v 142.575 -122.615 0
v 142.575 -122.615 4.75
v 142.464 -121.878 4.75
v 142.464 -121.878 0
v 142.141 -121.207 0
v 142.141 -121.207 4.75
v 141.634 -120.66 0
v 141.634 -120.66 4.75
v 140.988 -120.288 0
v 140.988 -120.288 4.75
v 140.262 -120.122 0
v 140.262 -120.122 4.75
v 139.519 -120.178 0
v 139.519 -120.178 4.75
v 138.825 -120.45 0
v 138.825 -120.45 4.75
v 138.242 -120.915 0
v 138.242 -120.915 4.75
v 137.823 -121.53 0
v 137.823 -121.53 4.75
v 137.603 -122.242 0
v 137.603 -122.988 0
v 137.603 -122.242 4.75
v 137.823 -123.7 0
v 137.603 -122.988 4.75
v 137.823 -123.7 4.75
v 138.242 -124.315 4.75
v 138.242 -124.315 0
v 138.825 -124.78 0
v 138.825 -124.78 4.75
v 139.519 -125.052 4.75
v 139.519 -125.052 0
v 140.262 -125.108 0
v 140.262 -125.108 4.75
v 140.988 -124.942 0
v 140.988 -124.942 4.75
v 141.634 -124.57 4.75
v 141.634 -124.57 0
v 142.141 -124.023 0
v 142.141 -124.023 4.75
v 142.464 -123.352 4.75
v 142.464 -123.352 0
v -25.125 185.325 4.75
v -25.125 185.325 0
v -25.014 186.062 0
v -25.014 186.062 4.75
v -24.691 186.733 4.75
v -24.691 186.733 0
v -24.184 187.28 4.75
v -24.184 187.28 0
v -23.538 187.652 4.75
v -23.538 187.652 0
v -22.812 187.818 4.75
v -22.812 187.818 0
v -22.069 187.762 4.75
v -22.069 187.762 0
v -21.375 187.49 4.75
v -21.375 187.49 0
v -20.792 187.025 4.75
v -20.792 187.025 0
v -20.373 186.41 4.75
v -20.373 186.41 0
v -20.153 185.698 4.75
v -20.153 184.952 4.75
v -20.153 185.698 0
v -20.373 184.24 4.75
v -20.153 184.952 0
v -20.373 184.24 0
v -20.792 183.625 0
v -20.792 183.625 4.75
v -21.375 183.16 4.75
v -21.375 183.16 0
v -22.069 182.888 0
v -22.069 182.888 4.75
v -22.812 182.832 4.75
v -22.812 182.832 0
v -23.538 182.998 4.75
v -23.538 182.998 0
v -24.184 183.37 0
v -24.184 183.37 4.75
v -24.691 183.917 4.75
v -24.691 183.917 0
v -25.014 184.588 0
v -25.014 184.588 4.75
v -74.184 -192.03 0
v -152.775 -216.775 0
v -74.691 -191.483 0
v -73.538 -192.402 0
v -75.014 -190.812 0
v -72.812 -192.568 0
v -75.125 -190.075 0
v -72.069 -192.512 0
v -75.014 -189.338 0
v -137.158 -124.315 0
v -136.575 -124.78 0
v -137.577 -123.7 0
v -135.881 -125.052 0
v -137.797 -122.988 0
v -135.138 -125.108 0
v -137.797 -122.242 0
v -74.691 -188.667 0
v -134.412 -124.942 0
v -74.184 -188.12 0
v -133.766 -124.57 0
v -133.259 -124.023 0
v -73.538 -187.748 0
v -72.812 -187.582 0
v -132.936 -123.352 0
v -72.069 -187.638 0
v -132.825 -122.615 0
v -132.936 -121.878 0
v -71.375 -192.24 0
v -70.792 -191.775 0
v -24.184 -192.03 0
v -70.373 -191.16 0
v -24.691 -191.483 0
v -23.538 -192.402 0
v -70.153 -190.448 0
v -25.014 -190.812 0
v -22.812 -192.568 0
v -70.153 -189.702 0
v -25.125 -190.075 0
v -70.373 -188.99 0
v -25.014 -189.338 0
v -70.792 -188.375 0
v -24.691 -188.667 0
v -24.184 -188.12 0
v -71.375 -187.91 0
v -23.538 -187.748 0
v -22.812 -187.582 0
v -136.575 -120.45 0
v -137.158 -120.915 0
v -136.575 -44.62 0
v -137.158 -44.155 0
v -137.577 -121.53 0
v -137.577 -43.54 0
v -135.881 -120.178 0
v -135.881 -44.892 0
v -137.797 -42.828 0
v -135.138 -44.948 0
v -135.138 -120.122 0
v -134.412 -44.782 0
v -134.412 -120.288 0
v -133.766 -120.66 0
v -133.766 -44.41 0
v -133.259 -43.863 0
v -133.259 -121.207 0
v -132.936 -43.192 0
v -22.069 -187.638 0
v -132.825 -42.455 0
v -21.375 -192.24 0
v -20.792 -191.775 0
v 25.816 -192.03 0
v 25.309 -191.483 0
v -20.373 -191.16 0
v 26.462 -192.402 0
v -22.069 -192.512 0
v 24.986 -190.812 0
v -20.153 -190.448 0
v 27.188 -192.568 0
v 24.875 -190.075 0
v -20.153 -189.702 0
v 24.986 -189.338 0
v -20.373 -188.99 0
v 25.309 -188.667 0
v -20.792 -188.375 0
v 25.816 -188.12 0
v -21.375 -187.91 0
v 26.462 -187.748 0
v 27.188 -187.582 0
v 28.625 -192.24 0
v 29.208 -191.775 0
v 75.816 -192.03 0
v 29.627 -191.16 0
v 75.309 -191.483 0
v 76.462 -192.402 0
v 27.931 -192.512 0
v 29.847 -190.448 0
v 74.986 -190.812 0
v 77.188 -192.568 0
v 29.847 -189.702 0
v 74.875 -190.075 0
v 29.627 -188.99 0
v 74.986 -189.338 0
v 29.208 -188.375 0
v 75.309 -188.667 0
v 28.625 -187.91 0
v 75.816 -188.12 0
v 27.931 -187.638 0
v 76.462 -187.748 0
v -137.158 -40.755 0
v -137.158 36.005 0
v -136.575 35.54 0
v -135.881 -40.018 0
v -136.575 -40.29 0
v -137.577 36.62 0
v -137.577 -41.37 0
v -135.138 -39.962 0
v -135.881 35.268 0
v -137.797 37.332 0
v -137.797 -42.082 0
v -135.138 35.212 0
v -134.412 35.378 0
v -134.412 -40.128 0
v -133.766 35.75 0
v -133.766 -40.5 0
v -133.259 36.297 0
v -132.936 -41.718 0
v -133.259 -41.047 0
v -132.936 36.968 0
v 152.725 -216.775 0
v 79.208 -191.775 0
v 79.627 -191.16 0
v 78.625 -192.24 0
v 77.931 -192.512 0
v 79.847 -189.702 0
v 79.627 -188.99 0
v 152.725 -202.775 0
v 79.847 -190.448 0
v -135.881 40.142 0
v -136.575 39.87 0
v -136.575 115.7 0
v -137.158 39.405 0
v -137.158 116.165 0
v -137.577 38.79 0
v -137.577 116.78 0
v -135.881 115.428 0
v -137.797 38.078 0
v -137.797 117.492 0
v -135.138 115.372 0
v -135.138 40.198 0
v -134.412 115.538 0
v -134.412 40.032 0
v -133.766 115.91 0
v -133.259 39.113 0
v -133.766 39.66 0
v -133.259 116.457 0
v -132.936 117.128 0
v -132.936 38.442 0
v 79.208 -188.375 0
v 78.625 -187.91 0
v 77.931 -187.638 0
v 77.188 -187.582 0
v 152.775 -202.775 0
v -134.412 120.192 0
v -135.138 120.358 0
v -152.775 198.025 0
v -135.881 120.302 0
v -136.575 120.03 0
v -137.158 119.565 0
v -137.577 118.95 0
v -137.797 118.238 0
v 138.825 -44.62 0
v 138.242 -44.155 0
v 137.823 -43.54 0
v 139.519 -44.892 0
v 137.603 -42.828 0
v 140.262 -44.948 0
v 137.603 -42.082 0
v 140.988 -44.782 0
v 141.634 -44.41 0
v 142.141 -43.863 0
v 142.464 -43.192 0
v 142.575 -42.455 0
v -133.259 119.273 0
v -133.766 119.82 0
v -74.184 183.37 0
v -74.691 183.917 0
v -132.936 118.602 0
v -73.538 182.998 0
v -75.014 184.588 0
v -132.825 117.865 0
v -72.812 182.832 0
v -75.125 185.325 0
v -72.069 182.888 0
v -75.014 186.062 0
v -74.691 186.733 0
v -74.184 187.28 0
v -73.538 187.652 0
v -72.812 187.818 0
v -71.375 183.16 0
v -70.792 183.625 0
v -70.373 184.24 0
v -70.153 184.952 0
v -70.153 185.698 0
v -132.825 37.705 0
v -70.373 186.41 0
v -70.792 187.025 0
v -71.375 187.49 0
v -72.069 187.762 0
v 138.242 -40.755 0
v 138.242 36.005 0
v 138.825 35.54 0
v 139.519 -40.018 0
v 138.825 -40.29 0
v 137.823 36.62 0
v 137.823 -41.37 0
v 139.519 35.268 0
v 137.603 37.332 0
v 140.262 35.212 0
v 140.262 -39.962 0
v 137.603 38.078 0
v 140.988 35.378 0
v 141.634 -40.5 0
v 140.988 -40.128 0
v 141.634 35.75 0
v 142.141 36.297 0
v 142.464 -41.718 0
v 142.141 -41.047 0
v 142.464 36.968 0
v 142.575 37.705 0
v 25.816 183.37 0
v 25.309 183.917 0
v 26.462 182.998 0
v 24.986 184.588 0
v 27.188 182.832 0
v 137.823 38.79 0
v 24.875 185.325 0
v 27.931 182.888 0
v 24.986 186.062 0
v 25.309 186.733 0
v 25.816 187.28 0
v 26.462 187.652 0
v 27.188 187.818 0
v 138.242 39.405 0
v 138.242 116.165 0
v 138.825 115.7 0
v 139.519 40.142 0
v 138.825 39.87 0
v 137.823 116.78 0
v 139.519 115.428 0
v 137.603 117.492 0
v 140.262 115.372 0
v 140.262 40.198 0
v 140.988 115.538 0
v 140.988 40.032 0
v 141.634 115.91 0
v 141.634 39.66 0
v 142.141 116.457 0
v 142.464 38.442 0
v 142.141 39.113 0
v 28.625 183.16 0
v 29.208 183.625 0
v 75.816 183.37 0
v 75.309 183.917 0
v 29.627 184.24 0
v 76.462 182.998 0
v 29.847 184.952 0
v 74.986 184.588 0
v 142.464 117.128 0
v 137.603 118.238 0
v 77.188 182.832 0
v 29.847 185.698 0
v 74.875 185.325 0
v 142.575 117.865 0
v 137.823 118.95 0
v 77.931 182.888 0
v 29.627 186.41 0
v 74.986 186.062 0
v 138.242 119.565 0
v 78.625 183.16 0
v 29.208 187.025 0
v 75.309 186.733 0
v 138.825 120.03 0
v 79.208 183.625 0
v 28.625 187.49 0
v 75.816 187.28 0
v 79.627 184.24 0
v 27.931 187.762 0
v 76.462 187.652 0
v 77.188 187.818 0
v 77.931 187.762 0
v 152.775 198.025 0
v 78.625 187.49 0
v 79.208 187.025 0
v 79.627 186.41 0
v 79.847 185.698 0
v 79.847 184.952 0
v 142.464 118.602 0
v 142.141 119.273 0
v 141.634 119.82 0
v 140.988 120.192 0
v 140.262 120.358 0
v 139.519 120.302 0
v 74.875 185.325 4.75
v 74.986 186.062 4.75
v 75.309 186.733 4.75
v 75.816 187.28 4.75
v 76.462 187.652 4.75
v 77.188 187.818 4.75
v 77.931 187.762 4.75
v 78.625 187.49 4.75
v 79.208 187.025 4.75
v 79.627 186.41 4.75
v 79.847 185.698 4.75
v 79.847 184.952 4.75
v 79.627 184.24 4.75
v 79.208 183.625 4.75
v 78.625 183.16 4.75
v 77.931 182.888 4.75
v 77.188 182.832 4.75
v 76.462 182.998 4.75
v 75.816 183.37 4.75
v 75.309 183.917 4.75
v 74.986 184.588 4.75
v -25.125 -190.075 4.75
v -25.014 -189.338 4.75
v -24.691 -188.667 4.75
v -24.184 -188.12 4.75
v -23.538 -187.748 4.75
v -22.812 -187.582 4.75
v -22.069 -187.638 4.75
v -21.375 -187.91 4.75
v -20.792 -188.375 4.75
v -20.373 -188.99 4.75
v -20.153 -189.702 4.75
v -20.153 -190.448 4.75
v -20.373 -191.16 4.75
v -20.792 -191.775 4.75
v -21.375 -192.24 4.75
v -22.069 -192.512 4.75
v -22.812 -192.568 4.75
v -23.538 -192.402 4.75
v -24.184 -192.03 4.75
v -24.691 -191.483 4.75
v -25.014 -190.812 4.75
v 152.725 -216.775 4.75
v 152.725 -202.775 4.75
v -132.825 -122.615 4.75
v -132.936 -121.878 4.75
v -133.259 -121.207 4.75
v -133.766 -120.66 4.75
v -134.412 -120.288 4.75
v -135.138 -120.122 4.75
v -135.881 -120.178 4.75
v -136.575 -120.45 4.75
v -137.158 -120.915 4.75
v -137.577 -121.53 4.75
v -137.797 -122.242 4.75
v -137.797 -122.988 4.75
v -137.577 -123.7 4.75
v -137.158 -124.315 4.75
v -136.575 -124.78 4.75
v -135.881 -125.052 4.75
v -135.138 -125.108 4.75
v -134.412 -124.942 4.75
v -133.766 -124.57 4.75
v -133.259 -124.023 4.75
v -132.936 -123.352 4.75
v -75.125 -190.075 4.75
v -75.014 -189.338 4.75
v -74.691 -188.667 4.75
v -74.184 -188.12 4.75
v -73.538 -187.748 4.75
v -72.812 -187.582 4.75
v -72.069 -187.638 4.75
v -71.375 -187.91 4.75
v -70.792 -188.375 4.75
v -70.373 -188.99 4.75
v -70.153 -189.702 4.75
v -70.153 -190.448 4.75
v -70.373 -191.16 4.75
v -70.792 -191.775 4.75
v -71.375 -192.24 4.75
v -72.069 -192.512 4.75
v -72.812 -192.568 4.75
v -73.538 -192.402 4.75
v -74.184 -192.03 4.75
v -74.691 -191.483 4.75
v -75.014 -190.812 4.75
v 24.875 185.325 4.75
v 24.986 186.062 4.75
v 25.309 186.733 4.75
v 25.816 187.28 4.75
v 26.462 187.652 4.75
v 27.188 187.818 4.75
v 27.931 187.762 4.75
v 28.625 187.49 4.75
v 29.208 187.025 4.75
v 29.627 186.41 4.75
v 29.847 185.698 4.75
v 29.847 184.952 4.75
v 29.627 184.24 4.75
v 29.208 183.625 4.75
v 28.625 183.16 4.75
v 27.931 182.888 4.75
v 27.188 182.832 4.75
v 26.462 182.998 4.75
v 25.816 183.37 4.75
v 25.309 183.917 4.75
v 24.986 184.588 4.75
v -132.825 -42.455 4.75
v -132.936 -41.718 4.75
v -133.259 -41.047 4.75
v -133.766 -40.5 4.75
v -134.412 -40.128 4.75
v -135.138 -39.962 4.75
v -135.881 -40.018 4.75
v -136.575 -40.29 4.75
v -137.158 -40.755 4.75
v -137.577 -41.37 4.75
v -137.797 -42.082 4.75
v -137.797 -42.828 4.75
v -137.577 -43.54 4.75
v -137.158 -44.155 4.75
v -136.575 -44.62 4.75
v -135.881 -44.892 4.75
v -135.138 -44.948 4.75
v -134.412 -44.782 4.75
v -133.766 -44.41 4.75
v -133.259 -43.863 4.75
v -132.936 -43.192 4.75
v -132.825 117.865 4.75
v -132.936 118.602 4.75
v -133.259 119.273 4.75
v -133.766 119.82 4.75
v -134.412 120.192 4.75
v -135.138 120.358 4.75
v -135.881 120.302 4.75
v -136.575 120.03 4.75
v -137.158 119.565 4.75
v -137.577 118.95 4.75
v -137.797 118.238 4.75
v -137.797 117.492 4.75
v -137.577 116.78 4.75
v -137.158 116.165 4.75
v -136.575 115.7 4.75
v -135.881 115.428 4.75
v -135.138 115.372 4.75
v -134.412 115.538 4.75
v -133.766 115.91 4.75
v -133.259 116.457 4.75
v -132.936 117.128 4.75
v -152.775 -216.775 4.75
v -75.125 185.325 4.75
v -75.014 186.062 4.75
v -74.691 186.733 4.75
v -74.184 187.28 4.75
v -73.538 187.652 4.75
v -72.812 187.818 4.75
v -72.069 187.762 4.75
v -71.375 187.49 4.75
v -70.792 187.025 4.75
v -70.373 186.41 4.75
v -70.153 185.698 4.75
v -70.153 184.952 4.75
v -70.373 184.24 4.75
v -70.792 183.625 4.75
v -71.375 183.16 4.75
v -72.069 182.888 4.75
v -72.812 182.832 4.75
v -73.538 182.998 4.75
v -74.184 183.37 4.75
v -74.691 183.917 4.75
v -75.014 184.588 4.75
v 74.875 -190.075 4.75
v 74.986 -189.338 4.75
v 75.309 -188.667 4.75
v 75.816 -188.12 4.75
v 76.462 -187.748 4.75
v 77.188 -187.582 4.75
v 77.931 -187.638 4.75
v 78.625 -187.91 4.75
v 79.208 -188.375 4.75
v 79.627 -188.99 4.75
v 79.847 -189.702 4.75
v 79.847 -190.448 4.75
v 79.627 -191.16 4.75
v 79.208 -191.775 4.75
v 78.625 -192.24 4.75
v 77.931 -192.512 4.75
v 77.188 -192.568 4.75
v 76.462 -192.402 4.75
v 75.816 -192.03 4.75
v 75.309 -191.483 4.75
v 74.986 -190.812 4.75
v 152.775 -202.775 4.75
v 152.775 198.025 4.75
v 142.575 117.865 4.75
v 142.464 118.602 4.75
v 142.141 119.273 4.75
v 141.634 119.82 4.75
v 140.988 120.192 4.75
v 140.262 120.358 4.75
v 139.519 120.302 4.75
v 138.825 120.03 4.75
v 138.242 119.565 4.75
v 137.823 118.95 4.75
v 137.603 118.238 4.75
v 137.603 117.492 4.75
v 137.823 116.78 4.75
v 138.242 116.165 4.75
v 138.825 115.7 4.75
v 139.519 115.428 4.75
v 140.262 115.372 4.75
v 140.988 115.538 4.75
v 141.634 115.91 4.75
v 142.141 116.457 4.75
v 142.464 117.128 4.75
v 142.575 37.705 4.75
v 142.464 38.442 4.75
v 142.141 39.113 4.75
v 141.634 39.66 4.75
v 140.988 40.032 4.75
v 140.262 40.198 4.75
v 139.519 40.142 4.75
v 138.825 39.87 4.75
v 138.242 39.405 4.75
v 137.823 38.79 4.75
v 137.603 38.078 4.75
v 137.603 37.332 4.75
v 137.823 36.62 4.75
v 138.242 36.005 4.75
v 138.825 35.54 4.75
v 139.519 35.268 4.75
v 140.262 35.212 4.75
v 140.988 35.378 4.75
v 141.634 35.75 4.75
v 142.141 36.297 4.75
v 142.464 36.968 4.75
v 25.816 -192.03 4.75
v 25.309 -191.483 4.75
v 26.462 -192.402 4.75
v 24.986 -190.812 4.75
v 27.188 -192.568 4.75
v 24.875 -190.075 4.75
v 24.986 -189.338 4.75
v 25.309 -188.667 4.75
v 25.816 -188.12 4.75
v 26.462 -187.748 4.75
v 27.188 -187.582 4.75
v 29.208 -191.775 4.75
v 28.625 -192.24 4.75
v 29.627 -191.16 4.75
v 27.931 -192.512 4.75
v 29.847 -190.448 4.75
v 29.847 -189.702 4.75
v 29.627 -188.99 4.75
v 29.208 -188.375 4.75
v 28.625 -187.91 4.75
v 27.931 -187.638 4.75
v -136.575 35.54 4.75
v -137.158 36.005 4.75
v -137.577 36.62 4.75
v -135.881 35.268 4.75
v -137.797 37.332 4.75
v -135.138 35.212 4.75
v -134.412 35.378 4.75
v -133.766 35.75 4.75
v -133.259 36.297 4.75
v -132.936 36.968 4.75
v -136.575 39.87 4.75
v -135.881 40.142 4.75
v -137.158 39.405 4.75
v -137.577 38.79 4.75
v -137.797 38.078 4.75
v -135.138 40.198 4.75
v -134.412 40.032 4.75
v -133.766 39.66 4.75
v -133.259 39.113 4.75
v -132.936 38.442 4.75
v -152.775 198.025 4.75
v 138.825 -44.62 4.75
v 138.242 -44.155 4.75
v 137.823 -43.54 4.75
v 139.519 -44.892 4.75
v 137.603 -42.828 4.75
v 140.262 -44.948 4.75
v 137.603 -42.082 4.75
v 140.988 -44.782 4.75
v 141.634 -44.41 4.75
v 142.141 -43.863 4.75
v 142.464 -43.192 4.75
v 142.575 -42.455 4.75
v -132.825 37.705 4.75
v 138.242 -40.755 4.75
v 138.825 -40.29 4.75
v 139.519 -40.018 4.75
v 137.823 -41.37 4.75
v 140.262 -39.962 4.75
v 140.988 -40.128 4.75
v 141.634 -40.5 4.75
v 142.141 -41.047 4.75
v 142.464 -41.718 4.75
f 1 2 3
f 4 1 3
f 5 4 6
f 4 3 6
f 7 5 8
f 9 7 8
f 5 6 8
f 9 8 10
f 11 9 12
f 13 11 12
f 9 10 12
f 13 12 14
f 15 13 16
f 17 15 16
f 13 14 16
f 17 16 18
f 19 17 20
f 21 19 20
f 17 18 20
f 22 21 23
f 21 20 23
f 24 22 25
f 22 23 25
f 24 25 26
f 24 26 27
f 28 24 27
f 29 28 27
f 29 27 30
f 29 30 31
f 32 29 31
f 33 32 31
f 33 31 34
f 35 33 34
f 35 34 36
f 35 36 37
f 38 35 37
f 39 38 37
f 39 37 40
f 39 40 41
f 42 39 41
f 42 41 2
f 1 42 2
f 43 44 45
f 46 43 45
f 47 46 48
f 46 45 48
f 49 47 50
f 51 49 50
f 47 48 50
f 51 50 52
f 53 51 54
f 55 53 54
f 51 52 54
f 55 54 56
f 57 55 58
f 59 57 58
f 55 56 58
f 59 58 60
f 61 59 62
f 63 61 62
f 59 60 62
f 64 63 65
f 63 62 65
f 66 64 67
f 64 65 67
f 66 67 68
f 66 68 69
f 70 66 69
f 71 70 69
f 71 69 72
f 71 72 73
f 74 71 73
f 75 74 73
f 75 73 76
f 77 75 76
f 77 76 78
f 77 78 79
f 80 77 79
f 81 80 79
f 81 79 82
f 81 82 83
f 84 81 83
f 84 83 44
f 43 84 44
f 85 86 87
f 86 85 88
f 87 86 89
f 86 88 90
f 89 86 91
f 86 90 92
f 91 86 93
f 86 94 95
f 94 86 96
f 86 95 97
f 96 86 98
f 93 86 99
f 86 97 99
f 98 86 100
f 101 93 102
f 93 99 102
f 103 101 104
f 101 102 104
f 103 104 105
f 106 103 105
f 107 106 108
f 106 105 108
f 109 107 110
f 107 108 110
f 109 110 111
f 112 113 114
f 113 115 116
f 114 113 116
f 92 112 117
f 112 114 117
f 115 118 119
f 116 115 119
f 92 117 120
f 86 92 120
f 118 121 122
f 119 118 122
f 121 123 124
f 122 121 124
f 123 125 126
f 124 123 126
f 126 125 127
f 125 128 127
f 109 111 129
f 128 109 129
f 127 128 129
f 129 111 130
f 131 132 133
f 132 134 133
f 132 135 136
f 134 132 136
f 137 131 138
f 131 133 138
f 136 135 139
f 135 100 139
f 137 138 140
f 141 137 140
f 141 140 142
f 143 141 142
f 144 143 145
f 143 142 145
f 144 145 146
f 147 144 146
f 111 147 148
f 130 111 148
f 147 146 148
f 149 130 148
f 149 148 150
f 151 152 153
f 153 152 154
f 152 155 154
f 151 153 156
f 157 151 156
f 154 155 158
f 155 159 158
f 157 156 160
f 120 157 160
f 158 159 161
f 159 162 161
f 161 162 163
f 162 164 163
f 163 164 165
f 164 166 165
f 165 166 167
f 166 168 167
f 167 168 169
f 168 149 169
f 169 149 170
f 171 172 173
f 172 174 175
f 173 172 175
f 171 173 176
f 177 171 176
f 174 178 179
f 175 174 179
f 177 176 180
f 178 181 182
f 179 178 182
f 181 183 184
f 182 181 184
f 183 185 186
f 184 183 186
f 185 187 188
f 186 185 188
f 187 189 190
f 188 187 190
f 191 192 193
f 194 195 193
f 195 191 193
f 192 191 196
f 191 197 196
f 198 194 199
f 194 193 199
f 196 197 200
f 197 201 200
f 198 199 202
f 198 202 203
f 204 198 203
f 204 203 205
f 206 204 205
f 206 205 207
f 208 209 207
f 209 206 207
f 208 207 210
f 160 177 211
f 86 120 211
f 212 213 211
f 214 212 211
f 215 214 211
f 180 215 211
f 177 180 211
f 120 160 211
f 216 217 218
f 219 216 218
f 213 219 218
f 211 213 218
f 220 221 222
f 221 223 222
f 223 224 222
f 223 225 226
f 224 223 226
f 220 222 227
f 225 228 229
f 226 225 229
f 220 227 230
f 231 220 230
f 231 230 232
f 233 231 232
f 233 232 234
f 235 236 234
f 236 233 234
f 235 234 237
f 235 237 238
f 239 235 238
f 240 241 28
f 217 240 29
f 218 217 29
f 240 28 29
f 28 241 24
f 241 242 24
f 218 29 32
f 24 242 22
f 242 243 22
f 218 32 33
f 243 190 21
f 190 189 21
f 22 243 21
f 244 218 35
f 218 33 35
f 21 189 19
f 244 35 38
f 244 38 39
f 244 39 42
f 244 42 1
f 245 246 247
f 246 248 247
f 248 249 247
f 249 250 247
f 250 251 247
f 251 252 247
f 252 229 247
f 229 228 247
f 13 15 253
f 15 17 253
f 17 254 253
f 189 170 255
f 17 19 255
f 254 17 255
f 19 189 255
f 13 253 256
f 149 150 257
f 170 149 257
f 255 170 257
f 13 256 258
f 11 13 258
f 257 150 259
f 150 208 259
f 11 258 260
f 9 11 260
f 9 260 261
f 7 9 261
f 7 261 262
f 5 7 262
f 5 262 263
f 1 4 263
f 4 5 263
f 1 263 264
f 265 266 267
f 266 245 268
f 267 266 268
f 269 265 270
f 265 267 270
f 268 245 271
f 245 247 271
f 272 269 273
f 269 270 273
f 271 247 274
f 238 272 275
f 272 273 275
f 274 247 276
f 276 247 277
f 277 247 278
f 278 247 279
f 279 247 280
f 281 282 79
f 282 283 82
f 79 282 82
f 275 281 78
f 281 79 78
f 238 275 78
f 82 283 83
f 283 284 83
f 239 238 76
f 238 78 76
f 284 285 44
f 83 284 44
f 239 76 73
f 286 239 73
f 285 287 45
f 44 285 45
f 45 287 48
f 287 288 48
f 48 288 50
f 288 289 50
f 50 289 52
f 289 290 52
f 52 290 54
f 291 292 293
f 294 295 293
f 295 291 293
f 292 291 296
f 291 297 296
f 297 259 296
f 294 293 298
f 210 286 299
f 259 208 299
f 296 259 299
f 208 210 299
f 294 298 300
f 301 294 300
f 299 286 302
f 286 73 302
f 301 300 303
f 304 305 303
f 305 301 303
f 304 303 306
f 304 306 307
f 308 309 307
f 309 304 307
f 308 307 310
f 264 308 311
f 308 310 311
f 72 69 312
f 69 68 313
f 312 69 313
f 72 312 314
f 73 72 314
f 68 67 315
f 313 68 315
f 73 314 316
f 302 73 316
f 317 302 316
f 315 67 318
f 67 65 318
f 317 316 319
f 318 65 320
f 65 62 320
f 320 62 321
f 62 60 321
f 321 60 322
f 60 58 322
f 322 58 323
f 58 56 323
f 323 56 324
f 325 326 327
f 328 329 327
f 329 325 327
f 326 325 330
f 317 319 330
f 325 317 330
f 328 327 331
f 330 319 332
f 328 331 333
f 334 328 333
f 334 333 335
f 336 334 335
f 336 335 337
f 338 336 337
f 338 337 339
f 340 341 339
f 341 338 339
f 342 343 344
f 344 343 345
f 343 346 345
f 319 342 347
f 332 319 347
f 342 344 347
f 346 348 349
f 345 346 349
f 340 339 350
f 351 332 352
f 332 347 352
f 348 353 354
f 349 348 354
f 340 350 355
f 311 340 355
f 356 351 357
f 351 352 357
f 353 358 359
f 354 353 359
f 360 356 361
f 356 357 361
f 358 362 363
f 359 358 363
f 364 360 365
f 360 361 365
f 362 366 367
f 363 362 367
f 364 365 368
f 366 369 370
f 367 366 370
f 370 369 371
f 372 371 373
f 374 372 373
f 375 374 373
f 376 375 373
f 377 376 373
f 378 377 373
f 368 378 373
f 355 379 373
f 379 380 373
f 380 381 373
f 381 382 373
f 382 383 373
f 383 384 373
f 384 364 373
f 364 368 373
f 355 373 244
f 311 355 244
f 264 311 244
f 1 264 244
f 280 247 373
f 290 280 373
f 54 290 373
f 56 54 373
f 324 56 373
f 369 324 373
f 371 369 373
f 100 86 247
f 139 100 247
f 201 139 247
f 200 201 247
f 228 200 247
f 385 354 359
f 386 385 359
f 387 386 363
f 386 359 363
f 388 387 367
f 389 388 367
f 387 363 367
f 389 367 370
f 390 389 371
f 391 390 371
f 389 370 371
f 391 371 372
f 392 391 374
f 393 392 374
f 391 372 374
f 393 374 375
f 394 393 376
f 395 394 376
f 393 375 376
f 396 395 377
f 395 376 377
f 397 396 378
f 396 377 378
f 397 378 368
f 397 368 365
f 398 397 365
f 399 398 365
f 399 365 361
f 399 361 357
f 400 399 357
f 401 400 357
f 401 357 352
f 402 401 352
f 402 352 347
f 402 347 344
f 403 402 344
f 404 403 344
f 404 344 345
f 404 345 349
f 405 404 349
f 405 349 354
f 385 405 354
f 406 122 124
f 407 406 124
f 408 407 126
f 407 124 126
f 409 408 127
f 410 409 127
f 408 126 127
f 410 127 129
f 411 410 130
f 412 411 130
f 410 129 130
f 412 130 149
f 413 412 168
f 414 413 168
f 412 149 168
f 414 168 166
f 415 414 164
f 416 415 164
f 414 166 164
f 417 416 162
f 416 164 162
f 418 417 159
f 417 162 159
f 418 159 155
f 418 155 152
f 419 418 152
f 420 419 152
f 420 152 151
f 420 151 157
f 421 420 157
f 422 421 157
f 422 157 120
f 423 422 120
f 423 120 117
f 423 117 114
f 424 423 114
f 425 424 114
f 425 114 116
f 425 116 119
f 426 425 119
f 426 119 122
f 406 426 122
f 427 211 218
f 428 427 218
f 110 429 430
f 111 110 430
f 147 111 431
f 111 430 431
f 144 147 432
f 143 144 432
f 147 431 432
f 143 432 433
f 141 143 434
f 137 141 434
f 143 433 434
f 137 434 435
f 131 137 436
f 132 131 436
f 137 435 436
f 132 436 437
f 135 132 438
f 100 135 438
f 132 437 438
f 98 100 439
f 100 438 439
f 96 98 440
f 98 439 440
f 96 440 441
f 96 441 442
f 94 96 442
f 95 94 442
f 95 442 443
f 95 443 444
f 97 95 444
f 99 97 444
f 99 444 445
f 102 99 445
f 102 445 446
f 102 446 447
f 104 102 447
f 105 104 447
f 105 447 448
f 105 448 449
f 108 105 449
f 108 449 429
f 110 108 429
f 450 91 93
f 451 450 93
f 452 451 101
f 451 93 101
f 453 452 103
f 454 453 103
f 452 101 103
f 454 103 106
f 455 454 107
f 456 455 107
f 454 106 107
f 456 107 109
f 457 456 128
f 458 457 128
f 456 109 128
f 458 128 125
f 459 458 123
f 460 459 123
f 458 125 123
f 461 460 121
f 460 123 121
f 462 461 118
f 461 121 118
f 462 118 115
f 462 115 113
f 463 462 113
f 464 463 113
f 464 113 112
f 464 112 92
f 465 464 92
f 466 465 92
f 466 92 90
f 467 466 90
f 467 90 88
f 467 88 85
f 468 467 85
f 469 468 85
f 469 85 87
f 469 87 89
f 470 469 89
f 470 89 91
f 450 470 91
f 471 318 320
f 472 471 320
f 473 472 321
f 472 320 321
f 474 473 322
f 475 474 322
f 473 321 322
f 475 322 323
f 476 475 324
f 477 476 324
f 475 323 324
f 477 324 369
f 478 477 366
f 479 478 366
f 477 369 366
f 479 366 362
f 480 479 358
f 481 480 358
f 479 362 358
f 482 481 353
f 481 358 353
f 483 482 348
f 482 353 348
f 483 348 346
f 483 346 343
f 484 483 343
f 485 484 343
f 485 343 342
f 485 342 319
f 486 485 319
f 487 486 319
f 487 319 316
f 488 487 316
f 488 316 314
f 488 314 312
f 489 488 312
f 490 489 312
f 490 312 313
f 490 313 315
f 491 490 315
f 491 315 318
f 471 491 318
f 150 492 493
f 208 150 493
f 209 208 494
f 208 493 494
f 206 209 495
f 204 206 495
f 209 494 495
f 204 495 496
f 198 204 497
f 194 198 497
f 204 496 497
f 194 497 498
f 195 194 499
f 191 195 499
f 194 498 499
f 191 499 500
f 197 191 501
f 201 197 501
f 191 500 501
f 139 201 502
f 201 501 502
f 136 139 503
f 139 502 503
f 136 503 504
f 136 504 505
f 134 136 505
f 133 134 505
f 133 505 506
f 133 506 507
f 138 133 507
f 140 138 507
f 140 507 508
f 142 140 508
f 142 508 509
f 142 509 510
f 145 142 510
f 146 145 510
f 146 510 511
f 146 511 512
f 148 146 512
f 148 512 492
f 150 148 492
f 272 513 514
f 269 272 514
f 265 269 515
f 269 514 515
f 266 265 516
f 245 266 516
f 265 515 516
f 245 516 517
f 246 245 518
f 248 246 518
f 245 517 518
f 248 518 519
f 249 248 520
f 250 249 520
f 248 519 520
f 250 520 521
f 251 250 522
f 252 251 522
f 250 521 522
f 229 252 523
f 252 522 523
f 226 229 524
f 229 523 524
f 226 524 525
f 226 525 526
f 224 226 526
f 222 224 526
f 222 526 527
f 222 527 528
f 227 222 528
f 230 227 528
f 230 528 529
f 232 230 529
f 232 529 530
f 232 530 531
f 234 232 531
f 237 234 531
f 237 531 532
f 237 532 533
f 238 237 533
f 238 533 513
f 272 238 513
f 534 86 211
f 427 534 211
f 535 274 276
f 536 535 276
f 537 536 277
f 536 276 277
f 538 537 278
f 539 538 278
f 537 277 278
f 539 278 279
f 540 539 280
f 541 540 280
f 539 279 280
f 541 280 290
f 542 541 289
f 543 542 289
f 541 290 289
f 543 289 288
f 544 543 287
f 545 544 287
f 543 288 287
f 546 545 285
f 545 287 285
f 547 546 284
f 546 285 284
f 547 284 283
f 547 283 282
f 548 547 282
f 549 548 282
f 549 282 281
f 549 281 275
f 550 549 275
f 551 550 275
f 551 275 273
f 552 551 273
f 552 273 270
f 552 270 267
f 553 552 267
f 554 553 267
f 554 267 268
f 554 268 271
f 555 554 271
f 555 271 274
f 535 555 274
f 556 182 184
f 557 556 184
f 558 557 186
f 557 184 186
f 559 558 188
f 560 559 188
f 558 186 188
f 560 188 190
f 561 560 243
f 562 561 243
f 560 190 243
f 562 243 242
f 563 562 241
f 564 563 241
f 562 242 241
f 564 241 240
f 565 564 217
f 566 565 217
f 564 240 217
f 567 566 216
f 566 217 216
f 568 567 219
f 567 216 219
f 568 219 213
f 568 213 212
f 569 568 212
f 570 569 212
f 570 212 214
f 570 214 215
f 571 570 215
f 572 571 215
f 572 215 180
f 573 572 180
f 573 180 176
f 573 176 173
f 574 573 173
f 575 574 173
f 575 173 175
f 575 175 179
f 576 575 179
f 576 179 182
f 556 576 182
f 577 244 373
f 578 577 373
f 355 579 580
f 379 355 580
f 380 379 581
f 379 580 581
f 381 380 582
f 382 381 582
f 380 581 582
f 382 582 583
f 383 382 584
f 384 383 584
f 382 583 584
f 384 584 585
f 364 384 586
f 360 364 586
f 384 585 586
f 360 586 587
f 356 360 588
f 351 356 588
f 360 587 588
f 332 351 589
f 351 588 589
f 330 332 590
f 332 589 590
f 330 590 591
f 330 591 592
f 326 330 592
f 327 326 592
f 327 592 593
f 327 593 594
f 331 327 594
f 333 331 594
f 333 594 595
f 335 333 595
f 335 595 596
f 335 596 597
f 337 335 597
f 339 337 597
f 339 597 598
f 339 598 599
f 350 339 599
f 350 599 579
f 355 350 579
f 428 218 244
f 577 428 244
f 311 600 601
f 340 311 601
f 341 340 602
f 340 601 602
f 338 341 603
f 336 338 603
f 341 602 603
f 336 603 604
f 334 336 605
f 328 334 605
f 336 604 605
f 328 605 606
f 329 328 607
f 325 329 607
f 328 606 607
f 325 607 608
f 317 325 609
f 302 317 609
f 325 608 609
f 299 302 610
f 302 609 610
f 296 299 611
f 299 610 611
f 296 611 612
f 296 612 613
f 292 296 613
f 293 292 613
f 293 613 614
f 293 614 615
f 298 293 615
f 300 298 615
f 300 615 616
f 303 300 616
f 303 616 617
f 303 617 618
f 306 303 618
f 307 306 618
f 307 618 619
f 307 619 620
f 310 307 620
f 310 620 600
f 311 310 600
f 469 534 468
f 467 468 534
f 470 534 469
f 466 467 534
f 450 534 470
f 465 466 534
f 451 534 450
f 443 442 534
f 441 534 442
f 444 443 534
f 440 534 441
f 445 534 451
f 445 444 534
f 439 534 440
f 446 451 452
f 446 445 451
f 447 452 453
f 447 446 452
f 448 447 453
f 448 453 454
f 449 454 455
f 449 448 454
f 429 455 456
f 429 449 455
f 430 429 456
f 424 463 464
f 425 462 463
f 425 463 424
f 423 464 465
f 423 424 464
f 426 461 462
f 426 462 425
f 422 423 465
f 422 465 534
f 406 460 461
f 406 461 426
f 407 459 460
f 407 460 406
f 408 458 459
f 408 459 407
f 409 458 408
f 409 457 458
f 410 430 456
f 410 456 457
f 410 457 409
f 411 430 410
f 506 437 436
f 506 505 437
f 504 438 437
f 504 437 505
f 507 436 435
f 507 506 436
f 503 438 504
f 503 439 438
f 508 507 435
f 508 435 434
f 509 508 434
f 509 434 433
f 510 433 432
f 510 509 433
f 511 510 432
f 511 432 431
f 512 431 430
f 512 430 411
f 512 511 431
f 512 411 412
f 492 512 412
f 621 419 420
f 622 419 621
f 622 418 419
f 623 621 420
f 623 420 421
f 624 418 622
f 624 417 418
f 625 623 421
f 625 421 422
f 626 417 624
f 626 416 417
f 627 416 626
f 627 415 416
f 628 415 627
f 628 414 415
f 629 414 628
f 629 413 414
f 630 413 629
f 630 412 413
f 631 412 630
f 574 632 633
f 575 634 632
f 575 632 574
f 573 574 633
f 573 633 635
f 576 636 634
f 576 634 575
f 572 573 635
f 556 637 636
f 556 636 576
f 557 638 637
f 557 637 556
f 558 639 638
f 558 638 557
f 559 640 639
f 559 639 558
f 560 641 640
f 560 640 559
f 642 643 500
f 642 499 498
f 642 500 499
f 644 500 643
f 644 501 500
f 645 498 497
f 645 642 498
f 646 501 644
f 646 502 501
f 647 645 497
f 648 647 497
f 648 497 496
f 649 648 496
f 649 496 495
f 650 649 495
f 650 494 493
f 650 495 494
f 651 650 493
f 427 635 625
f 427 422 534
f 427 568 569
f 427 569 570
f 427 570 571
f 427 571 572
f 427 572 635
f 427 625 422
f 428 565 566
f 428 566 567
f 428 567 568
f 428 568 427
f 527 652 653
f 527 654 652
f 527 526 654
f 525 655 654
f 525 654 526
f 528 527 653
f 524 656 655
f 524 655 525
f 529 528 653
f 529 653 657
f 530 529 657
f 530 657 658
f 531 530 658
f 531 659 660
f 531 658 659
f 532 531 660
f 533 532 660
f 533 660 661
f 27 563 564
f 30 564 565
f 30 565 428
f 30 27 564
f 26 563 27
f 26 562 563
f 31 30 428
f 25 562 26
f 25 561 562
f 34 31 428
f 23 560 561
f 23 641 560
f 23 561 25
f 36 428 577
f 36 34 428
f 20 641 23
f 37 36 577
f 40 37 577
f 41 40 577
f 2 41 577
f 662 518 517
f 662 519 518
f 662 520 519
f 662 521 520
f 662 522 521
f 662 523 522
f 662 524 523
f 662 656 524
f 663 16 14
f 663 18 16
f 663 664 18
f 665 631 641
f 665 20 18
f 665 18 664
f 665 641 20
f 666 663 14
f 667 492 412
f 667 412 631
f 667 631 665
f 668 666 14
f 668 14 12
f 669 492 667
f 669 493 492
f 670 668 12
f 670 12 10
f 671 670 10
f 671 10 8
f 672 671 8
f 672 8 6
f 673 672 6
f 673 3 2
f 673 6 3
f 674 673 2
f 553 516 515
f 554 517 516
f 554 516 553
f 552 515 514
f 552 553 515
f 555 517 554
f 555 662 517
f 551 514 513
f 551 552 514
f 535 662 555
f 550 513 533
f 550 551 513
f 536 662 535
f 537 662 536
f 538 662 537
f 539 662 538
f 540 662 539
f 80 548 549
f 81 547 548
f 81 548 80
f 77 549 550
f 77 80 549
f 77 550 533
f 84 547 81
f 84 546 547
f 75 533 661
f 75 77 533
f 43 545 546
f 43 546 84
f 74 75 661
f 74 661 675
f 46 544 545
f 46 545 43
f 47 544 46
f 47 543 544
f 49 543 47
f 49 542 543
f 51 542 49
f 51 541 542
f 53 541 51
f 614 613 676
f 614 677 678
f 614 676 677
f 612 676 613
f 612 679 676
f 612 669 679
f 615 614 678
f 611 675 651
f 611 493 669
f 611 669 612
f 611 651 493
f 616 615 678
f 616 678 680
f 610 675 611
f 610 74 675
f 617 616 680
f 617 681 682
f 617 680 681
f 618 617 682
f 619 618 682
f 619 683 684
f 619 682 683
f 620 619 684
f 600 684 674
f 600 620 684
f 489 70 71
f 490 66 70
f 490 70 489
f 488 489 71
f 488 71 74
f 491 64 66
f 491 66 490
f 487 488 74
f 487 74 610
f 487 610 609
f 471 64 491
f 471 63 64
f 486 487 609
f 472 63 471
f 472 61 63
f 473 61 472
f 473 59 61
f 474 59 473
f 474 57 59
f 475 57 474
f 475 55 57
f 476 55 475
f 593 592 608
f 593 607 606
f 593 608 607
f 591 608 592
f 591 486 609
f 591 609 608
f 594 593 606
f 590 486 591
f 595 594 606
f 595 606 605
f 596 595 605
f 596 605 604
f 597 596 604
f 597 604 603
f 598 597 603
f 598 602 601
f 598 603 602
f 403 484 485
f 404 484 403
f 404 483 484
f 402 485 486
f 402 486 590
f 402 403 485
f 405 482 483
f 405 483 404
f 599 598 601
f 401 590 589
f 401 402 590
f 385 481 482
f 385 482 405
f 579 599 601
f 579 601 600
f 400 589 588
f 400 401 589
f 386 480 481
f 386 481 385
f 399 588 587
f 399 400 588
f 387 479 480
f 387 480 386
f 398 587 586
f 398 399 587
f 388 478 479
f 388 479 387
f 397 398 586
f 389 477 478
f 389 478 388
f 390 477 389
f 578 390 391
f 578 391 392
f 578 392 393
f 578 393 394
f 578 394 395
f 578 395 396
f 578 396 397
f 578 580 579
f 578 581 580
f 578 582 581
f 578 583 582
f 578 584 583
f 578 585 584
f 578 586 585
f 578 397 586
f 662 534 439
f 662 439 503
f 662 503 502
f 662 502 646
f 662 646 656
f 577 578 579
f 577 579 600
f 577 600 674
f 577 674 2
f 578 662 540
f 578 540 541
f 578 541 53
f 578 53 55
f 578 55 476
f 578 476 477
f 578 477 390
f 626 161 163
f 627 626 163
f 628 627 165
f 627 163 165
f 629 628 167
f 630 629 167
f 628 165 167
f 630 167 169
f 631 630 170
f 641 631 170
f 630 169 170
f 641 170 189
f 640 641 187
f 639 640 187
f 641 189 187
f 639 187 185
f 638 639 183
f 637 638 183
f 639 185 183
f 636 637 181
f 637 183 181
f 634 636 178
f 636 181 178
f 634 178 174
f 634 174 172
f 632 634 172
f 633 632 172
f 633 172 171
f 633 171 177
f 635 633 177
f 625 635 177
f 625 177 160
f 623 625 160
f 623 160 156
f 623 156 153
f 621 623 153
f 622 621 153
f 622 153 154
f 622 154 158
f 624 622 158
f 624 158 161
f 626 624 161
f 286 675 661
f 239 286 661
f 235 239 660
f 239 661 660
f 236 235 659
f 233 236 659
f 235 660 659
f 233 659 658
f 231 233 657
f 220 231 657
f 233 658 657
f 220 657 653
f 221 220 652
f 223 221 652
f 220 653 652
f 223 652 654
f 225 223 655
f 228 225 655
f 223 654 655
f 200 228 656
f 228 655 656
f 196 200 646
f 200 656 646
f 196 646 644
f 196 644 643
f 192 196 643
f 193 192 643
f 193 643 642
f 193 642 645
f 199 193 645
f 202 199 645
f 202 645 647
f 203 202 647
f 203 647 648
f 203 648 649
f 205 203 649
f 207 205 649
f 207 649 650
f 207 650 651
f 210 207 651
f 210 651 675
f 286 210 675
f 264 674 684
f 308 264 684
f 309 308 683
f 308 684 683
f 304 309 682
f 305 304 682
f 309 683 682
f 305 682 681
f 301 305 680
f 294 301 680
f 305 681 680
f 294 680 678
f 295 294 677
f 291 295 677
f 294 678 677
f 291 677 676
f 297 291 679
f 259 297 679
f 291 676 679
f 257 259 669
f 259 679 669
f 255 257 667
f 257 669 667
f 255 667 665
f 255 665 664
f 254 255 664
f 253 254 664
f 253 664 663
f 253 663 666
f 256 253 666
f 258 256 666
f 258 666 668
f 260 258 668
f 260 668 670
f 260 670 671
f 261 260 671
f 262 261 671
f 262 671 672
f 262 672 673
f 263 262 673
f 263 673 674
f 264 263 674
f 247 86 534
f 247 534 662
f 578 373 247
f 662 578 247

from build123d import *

# Parameters (mm, degrees)
SKETCH_1_W                     = 305.55
SKETCH_1_H                     = 405.55
EXTRUDE_1_DEPTH                = 4.75
SKETCH_3_R                     = 2.5
CUT_EXTRUDE_1_DEPTH            = 10
SKETCH_5_R                     = 2.5
CUT_EXTRUDE_3_DEPTH            = 10
SKETCH_6_R                     = 2.5
CUT_EXTRUDE_4_DEPTH            = 10
SKETCH_7_R                     = 2.5
CUT_EXTRUDE_5_DEPTH            = 10
SPLIT_BODIES_1_SURFACE_1_BACK  = 508.793
SPLIT_BODIES_1_SURFACE_1_DEPTH = 1017.586
SKETCH_9_W                     = 305.5
SKETCH_9_H                     = 14
EXTRUDE_2_DEPTH                = 4.75


with BuildPart() as part:
    # 草圖1 → 填料-伸長1 (new body)
    with BuildSketch(Plane.XY):
        Rectangle(SKETCH_1_W, SKETCH_1_H)
    extrude(amount=EXTRUDE_1_DEPTH)

    # 草圖3 → 除料-伸長1 (cut)
    with BuildSketch(Plane.XY.offset(4.75)):
        with Locations((140.075, 37.705)):
            Circle(SKETCH_3_R)
        with Locations((140.075, 117.865)):
            Circle(SKETCH_3_R)
        with Locations((140.075, -42.455)):
            Circle(SKETCH_3_R)
        with Locations((140.075, -122.615)):
            Circle(SKETCH_3_R)
    extrude(amount=-CUT_EXTRUDE_1_DEPTH, mode=Mode.SUBTRACT)

    # 草圖5 → 除料-伸長3 (cut)
    with BuildSketch(Plane.XY.offset(4.75)):
        with Locations((-135.325, -122.615)):
            Circle(SKETCH_5_R)
        with Locations((-135.325, -42.455)):
            Circle(SKETCH_5_R)
        with Locations((-135.325, 37.705)):
            Circle(SKETCH_5_R)
        with Locations((-135.325, 117.865)):
            Circle(SKETCH_5_R)
    extrude(amount=-CUT_EXTRUDE_3_DEPTH, mode=Mode.SUBTRACT)

    # 草圖6 → 除料-伸長4 (cut)
    with BuildSketch(Plane(origin=(0, 0, 0), x_dir=(-1, 0, 0), z_dir=(0, 0, -1))):
        with Locations((22.625, 185.325)):
            Circle(SKETCH_6_R)
        with Locations((72.625, 185.325)):
            Circle(SKETCH_6_R)
        with Locations((-77.375, 185.325)):
            Circle(SKETCH_6_R)
        with Locations((-27.375, 185.325)):
            Circle(SKETCH_6_R)
    extrude(amount=-CUT_EXTRUDE_4_DEPTH, mode=Mode.SUBTRACT)

    # 草圖7 → 除料-伸長5 (cut)
    with BuildSketch(Plane(origin=(0, 0, 0), x_dir=(-1, 0, 0), z_dir=(0, 0, -1))):
        with Locations((-77.375, -190.075)):
            Circle(SKETCH_7_R)
        with Locations((-27.375, -190.075)):
            Circle(SKETCH_7_R)
        with Locations((22.625, -190.075)):
            Circle(SKETCH_7_R)
        with Locations((72.625, -190.075)):
            Circle(SKETCH_7_R)
    extrude(amount=-CUT_EXTRUDE_5_DEPTH, mode=Mode.SUBTRACT)

    # Split Bodies 1: cut with a surface, the side it looks to stays
    # Split Bodies 1 surface: a surface, the sketch's curves swept straight by 1017.586 mm
    with BuildLine(Plane.XY.offset(4.75).offset(-SPLIT_BODIES_1_SURFACE_1_BACK), mode=Mode.PRIVATE) as split_bodies_1_surface_1_path:
        Line((-152.775, 202.775), (152.775, 202.775))
        Line((152.775, 202.775), (152.775, 198.025))
        Line((152.775, 198.025), (-152.775, 198.025))
        Line((-152.775, 198.025), (-152.775, 202.775))
    split_bodies_1_surface_1 = Shell.extrude(split_bodies_1_surface_1_path.wire(), (0 * SPLIT_BODIES_1_SURFACE_1_DEPTH, 0 * SPLIT_BODIES_1_SURFACE_1_DEPTH, 1 * SPLIT_BODIES_1_SURFACE_1_DEPTH))
    split(bisect_by=split_bodies_1_surface_1, keep=Keep.TOP)

    # 草圖9 → 填料-伸長2 (add)
    with BuildSketch(Plane.XY):
        with Locations((-0.025, -209.775)):
            Rectangle(SKETCH_9_W, SKETCH_9_H)
    extrude(amount=EXTRUDE_2_DEPTH)


solid = part.part
